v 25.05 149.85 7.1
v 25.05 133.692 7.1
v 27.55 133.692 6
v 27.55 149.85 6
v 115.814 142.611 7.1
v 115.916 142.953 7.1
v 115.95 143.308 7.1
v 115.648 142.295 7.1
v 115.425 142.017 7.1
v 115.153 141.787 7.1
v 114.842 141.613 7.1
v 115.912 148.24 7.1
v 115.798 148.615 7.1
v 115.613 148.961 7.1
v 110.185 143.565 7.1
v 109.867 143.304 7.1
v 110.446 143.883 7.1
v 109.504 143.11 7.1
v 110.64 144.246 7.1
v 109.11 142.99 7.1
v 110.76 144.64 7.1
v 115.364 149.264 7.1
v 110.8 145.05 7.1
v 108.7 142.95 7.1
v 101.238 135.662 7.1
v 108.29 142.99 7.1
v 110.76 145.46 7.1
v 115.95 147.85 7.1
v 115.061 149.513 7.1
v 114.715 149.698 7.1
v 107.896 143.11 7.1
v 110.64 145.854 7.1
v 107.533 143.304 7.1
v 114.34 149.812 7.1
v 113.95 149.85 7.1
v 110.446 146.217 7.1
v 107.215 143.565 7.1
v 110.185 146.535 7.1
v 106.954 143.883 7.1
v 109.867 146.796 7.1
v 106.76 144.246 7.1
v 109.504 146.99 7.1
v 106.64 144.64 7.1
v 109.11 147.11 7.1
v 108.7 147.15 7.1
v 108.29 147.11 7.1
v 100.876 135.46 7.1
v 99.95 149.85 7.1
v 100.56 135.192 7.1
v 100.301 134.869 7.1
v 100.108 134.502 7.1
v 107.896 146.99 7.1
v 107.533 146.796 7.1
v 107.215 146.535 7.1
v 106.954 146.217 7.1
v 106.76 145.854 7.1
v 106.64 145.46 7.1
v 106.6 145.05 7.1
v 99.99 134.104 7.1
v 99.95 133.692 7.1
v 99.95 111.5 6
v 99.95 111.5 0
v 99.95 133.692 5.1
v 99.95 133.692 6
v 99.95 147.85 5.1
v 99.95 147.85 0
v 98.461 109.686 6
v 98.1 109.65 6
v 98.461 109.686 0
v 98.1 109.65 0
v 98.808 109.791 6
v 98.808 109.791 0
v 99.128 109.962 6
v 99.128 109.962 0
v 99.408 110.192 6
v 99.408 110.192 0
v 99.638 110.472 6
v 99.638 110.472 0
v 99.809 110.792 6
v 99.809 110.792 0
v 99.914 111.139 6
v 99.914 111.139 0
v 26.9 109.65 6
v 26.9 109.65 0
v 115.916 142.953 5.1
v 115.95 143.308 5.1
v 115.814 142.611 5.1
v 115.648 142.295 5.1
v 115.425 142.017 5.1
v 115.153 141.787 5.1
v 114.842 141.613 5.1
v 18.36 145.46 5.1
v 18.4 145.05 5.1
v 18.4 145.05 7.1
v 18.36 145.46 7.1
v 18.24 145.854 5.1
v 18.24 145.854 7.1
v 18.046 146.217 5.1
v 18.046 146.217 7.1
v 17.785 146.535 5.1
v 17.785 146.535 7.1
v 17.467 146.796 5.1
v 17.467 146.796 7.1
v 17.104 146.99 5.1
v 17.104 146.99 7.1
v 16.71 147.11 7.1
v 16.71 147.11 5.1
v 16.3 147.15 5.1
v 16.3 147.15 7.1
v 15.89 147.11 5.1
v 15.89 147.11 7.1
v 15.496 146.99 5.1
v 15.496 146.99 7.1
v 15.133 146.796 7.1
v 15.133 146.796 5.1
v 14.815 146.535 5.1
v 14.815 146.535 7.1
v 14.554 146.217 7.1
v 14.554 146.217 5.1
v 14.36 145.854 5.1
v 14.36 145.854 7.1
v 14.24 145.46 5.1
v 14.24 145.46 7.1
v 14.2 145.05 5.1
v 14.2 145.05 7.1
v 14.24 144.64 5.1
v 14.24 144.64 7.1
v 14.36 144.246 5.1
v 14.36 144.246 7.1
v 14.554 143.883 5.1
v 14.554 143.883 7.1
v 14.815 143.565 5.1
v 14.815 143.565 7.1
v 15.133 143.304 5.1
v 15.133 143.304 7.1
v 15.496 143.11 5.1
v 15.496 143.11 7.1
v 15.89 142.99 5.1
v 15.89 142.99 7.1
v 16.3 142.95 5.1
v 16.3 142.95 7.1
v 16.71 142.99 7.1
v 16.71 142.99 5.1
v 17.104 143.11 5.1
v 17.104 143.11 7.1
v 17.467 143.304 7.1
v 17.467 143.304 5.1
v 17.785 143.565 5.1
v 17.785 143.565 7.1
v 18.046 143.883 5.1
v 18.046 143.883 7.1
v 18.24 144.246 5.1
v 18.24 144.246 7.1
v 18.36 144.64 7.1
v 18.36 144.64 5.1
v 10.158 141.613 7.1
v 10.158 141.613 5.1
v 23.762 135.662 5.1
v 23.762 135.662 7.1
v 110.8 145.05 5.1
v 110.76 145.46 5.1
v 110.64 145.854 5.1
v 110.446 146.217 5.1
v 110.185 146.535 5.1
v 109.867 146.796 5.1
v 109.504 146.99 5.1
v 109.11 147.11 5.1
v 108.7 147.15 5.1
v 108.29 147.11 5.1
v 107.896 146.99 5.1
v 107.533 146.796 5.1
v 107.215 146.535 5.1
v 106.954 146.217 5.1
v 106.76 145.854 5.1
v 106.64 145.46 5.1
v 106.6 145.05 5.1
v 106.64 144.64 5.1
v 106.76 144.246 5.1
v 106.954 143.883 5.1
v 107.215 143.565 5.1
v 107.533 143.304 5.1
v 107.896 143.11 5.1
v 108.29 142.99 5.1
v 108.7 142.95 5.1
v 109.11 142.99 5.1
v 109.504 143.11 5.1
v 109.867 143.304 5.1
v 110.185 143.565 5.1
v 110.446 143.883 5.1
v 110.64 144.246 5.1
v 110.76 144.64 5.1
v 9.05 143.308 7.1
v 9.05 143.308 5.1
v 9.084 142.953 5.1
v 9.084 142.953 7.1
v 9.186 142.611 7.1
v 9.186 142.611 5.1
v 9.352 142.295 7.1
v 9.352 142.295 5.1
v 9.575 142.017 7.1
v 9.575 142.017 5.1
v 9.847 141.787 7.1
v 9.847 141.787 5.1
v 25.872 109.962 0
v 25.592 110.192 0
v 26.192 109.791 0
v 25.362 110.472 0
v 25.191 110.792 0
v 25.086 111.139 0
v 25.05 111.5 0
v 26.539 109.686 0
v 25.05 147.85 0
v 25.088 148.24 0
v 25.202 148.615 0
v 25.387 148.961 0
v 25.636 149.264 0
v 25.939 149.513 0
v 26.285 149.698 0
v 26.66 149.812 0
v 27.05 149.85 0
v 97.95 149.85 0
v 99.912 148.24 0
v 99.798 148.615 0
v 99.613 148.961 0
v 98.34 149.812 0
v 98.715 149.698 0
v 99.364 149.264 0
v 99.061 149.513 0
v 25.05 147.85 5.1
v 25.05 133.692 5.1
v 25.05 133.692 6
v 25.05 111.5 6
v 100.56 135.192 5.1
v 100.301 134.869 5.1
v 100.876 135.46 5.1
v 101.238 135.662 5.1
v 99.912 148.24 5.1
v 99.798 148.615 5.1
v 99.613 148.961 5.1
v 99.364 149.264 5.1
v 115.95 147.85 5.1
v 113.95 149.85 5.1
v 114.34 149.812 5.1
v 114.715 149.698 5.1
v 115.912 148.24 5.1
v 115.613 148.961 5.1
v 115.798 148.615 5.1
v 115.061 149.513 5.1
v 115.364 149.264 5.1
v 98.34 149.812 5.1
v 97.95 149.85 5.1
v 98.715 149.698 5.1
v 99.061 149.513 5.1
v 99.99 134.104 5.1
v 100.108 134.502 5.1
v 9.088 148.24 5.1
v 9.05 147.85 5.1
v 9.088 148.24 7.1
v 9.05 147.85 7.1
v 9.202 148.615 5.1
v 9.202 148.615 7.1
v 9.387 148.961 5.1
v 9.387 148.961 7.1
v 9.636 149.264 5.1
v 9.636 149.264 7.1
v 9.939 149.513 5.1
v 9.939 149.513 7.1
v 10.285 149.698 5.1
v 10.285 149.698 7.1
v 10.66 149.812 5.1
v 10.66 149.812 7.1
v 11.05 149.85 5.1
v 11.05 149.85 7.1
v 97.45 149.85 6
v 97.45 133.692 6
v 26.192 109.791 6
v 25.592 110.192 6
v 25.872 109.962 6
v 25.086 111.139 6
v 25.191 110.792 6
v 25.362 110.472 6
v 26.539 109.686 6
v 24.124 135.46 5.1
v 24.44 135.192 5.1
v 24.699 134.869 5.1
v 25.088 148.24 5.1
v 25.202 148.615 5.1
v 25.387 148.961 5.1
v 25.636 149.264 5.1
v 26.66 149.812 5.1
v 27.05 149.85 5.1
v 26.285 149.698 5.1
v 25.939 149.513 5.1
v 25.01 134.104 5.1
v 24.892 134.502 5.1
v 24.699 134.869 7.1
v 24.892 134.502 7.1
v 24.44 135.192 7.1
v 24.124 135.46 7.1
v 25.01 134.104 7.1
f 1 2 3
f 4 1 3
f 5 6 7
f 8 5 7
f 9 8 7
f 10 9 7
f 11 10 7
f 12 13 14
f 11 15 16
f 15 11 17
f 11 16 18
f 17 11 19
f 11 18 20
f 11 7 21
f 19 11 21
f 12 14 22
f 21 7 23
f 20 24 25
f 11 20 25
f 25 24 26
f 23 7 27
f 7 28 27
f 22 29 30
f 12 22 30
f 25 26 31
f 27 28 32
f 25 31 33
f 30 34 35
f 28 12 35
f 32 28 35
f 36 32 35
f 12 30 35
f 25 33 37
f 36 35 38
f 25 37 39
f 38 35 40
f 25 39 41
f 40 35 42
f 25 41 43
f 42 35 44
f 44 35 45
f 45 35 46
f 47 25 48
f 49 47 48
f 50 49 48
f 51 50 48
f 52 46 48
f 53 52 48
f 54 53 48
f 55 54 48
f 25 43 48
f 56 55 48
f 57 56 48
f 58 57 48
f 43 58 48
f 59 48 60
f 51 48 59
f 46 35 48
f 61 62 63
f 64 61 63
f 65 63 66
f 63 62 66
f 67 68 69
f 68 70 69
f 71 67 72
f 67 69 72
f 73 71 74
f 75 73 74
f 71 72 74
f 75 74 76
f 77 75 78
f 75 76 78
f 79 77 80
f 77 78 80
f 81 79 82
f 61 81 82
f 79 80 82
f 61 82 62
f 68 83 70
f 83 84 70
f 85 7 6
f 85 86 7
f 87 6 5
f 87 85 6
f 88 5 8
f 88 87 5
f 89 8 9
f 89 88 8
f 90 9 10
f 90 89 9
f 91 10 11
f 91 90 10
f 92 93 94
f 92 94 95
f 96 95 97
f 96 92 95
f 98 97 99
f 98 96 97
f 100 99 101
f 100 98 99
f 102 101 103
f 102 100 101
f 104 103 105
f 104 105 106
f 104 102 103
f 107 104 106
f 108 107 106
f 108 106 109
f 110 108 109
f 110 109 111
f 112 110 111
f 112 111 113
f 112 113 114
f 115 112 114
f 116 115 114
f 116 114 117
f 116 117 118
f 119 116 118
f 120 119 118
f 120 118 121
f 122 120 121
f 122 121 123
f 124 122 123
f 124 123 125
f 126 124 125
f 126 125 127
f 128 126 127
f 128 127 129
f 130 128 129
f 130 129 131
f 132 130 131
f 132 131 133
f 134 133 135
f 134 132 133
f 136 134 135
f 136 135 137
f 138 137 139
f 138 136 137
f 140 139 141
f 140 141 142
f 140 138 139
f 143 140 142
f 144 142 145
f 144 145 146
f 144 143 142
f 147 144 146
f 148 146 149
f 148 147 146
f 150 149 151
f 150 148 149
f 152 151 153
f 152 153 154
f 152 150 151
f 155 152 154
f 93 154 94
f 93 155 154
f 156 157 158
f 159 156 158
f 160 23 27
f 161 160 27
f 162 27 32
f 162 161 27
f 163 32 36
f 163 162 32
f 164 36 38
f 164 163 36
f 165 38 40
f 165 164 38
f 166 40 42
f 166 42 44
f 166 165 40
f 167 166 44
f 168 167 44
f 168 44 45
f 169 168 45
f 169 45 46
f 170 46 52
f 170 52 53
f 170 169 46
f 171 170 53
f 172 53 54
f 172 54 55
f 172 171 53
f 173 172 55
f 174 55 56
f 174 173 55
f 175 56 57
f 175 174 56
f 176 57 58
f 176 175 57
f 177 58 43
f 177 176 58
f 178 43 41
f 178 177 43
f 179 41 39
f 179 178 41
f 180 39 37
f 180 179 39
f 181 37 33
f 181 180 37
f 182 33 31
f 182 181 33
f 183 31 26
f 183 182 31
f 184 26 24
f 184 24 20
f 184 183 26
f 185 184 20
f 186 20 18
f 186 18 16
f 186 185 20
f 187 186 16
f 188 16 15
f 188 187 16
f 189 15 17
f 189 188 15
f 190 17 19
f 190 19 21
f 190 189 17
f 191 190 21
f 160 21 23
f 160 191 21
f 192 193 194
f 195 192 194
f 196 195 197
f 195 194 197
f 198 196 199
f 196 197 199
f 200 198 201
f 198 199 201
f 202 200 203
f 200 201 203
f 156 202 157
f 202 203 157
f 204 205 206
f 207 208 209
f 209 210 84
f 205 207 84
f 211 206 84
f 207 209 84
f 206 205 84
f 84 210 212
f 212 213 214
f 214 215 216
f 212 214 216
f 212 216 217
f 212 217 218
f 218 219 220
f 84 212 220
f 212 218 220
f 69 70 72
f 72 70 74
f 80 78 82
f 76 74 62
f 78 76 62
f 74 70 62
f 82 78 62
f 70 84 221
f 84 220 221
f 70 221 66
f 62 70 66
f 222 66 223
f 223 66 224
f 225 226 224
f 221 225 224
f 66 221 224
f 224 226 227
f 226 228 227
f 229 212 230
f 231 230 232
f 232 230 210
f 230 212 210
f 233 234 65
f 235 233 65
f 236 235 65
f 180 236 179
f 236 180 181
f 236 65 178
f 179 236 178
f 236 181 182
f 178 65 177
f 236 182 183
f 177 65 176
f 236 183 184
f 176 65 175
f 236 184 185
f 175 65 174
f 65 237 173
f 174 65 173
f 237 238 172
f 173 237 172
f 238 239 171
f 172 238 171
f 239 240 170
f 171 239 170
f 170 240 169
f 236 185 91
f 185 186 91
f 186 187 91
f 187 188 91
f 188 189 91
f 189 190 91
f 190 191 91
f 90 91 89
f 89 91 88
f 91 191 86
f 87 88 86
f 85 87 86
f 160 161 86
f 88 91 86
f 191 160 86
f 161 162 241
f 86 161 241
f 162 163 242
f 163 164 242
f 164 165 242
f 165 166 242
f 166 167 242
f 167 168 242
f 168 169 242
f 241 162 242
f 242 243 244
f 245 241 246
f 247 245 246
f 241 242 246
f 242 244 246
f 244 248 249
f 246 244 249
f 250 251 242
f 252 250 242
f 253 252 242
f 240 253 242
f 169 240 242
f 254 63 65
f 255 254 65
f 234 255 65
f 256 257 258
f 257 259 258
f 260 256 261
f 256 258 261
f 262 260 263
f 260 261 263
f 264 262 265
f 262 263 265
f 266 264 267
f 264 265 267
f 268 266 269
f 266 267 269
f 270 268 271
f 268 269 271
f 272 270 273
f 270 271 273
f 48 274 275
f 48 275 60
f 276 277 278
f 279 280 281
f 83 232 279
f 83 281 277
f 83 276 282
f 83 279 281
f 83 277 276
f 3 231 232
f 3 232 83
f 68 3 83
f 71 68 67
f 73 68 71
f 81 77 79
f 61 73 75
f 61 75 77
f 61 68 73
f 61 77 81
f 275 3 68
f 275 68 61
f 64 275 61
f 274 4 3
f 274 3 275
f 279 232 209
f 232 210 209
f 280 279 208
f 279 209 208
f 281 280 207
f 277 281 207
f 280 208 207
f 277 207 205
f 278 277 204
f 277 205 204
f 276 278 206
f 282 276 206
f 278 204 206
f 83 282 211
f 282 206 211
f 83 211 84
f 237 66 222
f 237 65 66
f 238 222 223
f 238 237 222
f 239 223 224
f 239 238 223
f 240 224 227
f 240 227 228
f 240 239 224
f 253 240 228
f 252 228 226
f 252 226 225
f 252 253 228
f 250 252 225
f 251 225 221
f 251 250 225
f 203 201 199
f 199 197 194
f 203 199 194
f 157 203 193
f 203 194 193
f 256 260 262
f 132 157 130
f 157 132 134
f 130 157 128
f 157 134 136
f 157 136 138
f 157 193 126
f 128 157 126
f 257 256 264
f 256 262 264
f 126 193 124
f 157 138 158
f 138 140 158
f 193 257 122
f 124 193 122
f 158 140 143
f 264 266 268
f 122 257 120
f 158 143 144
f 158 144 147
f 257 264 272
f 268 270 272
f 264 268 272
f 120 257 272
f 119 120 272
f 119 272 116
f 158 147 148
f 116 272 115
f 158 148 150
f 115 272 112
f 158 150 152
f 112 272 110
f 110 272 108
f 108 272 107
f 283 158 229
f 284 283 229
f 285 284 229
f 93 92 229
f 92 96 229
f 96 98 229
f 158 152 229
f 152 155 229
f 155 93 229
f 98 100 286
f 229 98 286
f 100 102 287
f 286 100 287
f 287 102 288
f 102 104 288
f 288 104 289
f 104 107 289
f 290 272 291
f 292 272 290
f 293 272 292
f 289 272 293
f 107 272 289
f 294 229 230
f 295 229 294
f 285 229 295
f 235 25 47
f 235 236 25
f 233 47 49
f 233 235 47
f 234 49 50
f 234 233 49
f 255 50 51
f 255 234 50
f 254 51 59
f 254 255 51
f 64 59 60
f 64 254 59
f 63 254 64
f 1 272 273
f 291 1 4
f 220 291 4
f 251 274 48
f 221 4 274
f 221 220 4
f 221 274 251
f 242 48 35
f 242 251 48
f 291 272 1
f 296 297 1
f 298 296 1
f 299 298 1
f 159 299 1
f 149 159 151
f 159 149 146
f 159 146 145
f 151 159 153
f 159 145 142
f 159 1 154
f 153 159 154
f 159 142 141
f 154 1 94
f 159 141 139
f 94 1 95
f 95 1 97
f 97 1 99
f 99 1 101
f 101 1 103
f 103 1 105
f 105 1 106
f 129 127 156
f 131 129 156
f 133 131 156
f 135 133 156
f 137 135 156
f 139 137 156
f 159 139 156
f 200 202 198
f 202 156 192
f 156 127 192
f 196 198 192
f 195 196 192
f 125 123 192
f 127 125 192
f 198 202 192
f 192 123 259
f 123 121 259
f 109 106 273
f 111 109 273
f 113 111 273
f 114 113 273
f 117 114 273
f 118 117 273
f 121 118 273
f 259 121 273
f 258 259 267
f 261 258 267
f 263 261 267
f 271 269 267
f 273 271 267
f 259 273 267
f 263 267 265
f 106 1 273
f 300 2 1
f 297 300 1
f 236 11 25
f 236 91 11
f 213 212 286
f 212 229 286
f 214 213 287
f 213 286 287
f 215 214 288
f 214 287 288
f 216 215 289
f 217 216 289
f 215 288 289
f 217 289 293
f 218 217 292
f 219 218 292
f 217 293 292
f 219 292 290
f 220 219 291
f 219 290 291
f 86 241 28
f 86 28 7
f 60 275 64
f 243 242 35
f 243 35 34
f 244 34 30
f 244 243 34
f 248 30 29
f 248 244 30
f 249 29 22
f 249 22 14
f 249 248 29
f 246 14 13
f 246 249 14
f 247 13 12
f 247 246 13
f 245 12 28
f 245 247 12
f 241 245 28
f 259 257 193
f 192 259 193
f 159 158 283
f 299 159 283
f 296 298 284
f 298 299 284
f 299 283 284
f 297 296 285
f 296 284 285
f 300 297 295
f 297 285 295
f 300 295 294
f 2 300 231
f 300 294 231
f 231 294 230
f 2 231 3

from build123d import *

# Parameters (mm, degrees)
BOSS_EXTRUDE1_DEPTH = 5.1
SKETCH2_R           = 2.1
BOSS_EXTRUDE2_DEPTH = 0.9
FILLET1_R           = 2
SKETCH3_R           = 2.1
BOSS_EXTRUDE3_DEPTH = 1.1
BOSS_EXTRUDE4_DEPTH = 16.158031


with BuildPart() as part:
    # Sketch1 → Boss-Extrude1 (new body)
    with BuildSketch(Plane.XY):
        with BuildLine():
            Line((99.95, 149.85), (25.05, 149.85))
            Line((25.05, 149.85), (25.05, 148))
            Line((25.05, 148), (25.05, 111.5))
            ThreePointArc((25.05, 111.5), (25.591852455, 110.191852455), (26.9, 109.65))
            Line((26.9, 109.65), (98.1, 109.65))
            ThreePointArc((98.1, 109.65), (99.408147545, 110.191852455), (99.95, 111.5))
            Line((99.95, 111.5), (99.95, 148))
            Line((99.95, 148), (99.95, 149.85))
        make_face()
    extrude(amount=BOSS_EXTRUDE1_DEPTH)

    # Sketch2 → Boss-Extrude2 (add)
    with BuildSketch(Plane.XY.offset(5.1)):
        with BuildLine():
            Line((102.1, 149.85), (22.9, 149.85))
            Line((22.9, 149.85), (9.05, 149.85))
            Line((9.05, 149.85), (9.05, 148))
            Line((9.05, 148), (9.05, 143.30803115))
            ThreePointArc((9.05, 143.30803115), (9.351726371, 142.295436082), (10.158485157, 141.61314008))
            Line((10.158485157, 141.61314008), (23.761760493, 135.66170712))
            ThreePointArc((23.761760493, 135.66170712), (24.699345028, 134.868768523), (25.05, 133.69196885))
            Line((25.05, 133.69196885), (25.05, 111.5))
            ThreePointArc((25.05, 111.5), (25.591852455, 110.191852455), (26.9, 109.65))
            Line((26.9, 109.65), (98.1, 109.65))
            ThreePointArc((98.1, 109.65), (99.408147545, 110.191852455), (99.95, 111.5))
            Line((99.95, 111.5), (99.95, 133.69196885))
            ThreePointArc((99.95, 133.69196885), (100.300654972, 134.868768523), (101.238239507, 135.66170712))
            Line((101.238239507, 135.66170712), (114.841514843, 141.61314008))
            ThreePointArc((114.841514843, 141.61314008), (115.648273629, 142.295436082), (115.95, 143.30803115))
            Line((115.95, 143.30803115), (115.95, 148))
            Line((115.95, 148), (115.95, 149.85))
            Line((115.95, 149.85), (102.1, 149.85))
        make_face()
        with Locations((16.3, 145.05)):
            Circle(SKETCH2_R, mode=Mode.SUBTRACT)
        with Locations((108.7, 145.05)):
            Circle(SKETCH2_R, mode=Mode.SUBTRACT)
    extrude(amount=BOSS_EXTRUDE2_DEPTH)

    # Fillet1
    fillet1_edges = [part.edges().sort_by_distance(p)[0] for p in [
        (25.05, 149.85, 2.55),
        (99.95, 149.85, 2.55),
        (115.95, 149.85, 5.55),
        (9.05, 149.85, 5.55),
    ]]
    fillet(fillet1_edges, radius=FILLET1_R)

    # Sketch3 → Boss-Extrude3 (add)
    with BuildSketch(Plane.XY.offset(6)):
        with BuildLine():
            Line((99.95, 133.69196885), (99.95, 149.85))
            Line((99.95, 149.85), (113.95, 149.85))
            ThreePointArc((113.95, 149.85), (115.364213562, 149.264213562), (115.95, 147.85))
            Line((115.95, 147.85), (115.95, 143.30803115))
            ThreePointArc((115.95, 143.30803115), (115.648273629, 142.295436082), (114.841514843, 141.61314008))
            Line((114.841514843, 141.61314008), (101.238239507, 135.66170712))
            ThreePointArc((101.238239507, 135.66170712), (100.300654972, 134.868768523), (99.95, 133.69196885))
        make_face()
        with Locations((108.7, 145.05)):
            Circle(SKETCH3_R, mode=Mode.SUBTRACT)
        with BuildLine():
            Line((11.05, 149.85), (25.05, 149.85))
            Line((25.05, 149.85), (25.05, 133.69196885))
            ThreePointArc((25.05, 133.69196885), (24.699345028, 134.868768523), (23.761760493, 135.66170712))
            Line((23.761760493, 135.66170712), (10.158485157, 141.61314008))
            ThreePointArc((10.158485157, 141.61314008), (9.351726371, 142.295436082), (9.05, 143.30803115))
            Line((9.05, 143.30803115), (9.05, 147.85))
            ThreePointArc((9.05, 147.85), (9.635786438, 149.264213562), (11.05, 149.85))
        make_face()
        with Locations((16.3, 145.05)):
            Circle(SKETCH3_R, mode=Mode.SUBTRACT)
    extrude(amount=BOSS_EXTRUDE3_DEPTH)

    # Sketch4 → Boss-Extrude4 (add)
    with BuildSketch(Plane(origin=(0, 149.85, 0), x_dir=(1, 0, 0), z_dir=(0, 1, 0))):
        Polygon((25.05, -7.1), (27.55, -6), (25.05, -6), align=None)
        Polygon((97.45, -6), (99.95, -7.1), (99.95, -6), align=None)
    extrude(amount=-BOSS_EXTRUDE4_DEPTH)


solid = part.part
